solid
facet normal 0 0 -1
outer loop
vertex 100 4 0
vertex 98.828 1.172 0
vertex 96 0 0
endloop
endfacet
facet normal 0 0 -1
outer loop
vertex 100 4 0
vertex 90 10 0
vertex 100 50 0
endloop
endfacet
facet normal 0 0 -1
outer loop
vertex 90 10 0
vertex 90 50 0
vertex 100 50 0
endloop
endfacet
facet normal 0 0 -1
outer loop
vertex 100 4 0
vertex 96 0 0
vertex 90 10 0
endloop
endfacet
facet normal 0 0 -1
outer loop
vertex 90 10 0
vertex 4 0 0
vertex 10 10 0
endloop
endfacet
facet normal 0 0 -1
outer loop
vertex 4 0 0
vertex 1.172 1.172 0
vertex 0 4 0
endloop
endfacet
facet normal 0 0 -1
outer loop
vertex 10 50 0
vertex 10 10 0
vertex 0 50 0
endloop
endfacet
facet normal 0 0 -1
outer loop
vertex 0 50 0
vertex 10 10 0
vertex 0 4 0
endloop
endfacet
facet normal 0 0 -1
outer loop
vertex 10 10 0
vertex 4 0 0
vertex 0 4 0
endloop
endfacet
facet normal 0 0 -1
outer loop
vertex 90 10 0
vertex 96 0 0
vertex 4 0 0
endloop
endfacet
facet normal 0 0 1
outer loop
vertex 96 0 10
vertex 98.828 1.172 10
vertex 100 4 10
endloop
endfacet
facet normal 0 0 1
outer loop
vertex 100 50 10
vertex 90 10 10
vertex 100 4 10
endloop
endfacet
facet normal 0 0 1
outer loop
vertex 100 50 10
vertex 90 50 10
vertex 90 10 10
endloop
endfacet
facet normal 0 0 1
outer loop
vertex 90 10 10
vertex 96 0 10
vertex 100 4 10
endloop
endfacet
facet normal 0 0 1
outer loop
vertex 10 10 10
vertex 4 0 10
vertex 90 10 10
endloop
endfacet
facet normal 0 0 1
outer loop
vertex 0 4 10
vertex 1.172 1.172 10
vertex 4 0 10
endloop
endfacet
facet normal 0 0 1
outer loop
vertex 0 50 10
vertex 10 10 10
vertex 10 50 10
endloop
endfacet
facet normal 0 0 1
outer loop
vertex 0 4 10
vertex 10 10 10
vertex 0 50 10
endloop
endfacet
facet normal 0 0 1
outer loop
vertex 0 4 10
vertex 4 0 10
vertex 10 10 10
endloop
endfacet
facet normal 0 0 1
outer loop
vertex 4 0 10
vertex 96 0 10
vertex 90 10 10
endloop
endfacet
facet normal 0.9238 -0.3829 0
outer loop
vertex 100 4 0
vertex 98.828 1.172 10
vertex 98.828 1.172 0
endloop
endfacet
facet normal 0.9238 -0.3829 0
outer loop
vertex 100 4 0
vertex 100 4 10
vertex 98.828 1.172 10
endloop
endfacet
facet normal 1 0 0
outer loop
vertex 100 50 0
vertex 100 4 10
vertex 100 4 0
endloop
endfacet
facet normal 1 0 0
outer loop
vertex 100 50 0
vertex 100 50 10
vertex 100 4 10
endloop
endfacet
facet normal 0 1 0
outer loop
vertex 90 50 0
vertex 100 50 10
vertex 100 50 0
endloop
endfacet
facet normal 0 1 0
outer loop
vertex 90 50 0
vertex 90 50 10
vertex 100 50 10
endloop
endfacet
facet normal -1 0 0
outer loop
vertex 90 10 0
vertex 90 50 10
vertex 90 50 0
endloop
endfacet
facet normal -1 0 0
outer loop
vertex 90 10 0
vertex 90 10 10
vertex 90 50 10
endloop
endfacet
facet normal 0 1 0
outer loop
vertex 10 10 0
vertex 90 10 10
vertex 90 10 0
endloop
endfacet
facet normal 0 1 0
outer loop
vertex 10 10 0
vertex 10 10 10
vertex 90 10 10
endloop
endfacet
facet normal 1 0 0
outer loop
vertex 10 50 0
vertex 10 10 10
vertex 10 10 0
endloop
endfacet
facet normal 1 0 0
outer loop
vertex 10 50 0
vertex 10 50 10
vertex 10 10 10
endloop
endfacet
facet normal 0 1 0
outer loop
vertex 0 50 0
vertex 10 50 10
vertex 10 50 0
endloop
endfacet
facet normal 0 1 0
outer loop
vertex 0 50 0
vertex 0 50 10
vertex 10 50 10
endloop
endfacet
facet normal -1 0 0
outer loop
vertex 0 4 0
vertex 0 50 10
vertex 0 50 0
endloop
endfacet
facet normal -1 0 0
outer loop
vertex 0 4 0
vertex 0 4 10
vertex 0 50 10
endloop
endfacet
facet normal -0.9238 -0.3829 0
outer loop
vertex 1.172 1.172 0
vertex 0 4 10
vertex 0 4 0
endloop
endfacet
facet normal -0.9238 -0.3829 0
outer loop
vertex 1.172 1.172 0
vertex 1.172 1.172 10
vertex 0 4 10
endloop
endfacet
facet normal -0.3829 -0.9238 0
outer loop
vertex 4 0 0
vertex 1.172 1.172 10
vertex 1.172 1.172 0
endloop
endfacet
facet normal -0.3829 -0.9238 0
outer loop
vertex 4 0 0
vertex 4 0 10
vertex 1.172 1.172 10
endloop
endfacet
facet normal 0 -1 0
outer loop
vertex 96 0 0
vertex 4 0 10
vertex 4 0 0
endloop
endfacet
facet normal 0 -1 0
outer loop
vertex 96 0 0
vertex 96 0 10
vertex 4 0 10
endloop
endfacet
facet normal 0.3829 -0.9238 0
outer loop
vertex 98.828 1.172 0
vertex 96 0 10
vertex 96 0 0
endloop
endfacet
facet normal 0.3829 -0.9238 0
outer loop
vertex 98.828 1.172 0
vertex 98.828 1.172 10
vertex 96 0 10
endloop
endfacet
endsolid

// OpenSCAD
$fn = 32;

// ----------------------------------------------------------------------
// Heat sink frame: 100 x 50 mm frame, 10 mm walls
// ----------------------------------------------------------------------

// --- parameters (mm) ---
profile_height = 10;      // extrusion height
profile_points = 12;      // points of the closed outline

profile = [[0, 4], [1.172, 1.172], [4, 0], [96, 0], [98.828, 1.172], [100, 4], [100, 50], [90, 50], [90, 10], [10, 10], [10, 50], [0, 50]];  // single closed polygon, 12 points, counter clockwise

// --- the one profile operation ---
linear_extrude(height = profile_height) polygon(points = profile);
